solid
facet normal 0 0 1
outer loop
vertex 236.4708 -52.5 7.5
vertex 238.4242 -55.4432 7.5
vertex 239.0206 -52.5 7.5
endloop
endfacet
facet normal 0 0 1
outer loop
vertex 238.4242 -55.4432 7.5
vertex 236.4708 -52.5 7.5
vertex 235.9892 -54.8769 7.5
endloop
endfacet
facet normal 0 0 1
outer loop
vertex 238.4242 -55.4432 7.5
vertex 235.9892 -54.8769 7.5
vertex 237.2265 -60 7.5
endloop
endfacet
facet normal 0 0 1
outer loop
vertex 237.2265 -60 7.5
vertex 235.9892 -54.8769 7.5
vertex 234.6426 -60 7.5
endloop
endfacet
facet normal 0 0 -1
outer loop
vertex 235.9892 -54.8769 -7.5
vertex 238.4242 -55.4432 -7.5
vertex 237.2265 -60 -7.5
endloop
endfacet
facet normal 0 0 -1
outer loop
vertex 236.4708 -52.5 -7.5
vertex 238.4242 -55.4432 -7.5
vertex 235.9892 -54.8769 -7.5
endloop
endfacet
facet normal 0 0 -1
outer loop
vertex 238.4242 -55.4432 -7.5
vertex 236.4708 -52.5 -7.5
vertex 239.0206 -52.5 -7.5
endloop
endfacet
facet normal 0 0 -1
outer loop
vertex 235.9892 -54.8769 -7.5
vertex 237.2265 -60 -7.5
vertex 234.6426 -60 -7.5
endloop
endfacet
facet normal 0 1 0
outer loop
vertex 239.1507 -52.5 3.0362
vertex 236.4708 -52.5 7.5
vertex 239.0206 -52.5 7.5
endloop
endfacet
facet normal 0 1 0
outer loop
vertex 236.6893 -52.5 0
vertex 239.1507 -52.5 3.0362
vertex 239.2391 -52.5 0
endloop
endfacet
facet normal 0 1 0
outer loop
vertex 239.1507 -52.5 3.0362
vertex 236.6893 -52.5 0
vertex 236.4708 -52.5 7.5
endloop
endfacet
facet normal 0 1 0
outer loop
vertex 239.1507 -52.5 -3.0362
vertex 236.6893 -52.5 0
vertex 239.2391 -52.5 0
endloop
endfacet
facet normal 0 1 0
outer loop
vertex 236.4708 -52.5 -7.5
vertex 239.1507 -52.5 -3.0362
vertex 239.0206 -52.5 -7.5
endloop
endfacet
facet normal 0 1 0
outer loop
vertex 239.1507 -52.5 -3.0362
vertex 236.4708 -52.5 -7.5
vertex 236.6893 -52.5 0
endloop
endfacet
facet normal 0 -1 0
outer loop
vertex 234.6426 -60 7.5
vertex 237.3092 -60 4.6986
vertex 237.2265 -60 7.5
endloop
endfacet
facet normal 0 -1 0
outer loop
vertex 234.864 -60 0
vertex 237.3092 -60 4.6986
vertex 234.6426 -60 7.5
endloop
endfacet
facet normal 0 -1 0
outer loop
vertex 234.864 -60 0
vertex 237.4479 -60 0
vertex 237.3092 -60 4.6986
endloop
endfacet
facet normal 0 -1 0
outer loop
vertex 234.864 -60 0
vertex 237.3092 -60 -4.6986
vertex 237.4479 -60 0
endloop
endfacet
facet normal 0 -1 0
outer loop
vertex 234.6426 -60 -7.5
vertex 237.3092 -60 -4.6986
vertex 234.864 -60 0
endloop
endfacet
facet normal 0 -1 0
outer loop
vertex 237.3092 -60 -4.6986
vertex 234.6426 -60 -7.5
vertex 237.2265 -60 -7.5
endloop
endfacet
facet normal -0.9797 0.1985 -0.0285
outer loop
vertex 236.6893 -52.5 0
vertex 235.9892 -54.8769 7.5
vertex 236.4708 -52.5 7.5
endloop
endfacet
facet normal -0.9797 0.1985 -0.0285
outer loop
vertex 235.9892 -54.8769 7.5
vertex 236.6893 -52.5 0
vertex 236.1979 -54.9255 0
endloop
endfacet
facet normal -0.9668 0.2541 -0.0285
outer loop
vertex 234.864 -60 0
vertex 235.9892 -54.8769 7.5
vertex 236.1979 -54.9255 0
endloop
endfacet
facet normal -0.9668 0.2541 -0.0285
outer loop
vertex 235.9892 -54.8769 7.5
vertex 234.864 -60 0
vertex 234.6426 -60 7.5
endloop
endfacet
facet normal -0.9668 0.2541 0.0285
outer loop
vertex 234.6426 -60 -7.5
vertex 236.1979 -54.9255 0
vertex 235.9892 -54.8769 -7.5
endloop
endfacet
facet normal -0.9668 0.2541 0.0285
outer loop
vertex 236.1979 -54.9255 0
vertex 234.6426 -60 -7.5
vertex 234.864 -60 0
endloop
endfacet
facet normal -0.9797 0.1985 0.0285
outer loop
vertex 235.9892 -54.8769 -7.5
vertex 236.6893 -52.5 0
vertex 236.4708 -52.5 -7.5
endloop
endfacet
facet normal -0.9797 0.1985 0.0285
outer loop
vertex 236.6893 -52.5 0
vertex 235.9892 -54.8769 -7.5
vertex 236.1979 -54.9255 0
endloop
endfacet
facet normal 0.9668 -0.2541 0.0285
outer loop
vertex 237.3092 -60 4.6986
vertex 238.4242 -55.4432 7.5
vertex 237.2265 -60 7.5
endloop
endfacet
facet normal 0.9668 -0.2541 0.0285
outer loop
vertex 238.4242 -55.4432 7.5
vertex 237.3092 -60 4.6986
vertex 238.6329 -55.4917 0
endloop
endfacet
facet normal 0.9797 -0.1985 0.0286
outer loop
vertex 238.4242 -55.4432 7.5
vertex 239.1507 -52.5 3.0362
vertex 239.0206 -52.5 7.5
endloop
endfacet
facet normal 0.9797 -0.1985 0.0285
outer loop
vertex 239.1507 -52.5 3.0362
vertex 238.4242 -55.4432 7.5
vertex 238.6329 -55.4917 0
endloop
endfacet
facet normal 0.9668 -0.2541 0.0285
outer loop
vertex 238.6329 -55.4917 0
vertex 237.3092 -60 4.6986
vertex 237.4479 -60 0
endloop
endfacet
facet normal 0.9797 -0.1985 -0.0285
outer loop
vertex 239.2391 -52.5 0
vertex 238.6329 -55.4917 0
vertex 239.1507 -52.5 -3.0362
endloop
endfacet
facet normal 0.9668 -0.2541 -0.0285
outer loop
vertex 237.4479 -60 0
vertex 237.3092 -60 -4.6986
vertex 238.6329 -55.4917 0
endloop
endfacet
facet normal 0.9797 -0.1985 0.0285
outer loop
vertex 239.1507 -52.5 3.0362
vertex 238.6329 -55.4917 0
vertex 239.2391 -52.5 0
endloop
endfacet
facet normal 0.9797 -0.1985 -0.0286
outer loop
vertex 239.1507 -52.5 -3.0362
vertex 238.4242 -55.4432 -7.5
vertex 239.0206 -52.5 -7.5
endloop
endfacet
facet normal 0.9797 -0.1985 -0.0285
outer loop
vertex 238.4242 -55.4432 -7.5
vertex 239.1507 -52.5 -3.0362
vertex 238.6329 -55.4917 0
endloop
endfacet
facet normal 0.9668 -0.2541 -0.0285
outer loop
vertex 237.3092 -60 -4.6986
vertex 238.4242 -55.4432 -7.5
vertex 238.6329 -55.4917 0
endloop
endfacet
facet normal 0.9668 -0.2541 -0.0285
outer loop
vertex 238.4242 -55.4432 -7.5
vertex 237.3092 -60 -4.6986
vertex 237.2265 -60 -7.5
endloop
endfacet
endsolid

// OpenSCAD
// file: ../motors/MN5212.scad
use <../utils.scad>

module MN5212(){

	render(){
		translate([0,0, 42.5 / 2 - 23 / 2 - 4.9 - 6])
			cylinder(
				h = 23,
				r = 59 / 2,
				$fa = fa(59 / 2),
				center = true);
		translate([0,0, 42.5 / 2 - 4.9 / 2 - 6])
			cylinder(
				h = 4.9,
				r1 = 59 / 2,
				r2 = 24.8 / 2,
				$fa = fa(59 / 2),
				center = true);
		translate([0,0, - 42.5 / 2 + 5.6 / 2 + 3])
			cylinder(
				h = 5.6,
				r1 = 44 / 2,
				r2 = 59 / 2,
				$fa = fa(59 / 2),
				center = true);
		translate([0, 0, 42.5 / 2 - 3])
			cylinder(
				h = 6,
				r = 4 / 2,
				$fa = fa(4 / 2),
				center = true);
		translate([0, 0, - 42.5 / 2 + 1.5])
			cylinder(
				h = 3,
				r = 6 / 2,
				$fa = fa(6 / 2),
				center = true);
	}

}
// file: ../servos/HS_5065MG.scad
use <../utils.scad>

module HS_5065MG(){

	length = 23.75;
	width = 11.68;
	depth = 20.32;
	wing_width = 32.38;
	wing_thick = 3.43;
	shaft_offset = 6;
	hole_spacing = 28.32;
	shaft_height = 26.16;
	shaft_length = 2;

	module mounting_hole(){
		mh_rad = 2 / 2;
		translate(
			[
				hole_spacing / 2,
				0,
				depth / 2 - wing_thick / 2
			])
			cylinder(h = 5, r = mh_rad, $fa = fa(mh_rad), center = true);
	}

	difference(){
		union(){
			cube([length, width, depth], center = true);
			translate([0, 0, depth / 2 - wing_thick / 2])
				cube([wing_width, width, wing_thick], center = true);
			translate(
				[
					- length / 2 + shaft_offset,
					0,
					shaft_height - length / 2 + shaft_length / 2
				])
				cylinder(
					h = shaft_length,
					r = 1.5,
					$fa = fa(1.5),
					center = true);
		}	union(){

			mounting_hole();
			mirror() mounting_hole();
		}
	}
}

HS_5065MG();
// file: ../servos/LS_0006_servo.scad
// Author Michael Marques (DrYerzinia)

use <../utils.scad>

module ls_0006_servo(){
	
	length = 21.4;
	depth = 19.9;
	thickness = 11.65;

	gear_height = 2.6;
	gear_bump_height = 0.7;
	gear_bump_diameter = 1.97;
	gear_outer_bump_diameter = 6;
	gear_bump_offset = 12.2;

	shaft_height = 2.4;
	shaft_diameter = 3.74;
	shaft_offset = thickness / 2;
	shaft_screw_diameter = 1.3;
	
	wing_outer_width = 8.5;
	wing_top_off = 3.8;
	wing_length = 3.8;
	wing_thickness = 1.2;
	wing_hole_diameter = 1.85;
	wing_hole_edge_dist = 2;

	module wing_hole(){
		translate(
			[
				length / 2 + wing_hole_edge_dist,
				0,
				depth/2 - wing_top_off - wing_thickness / 2
			])
			cylinder(
				h = wing_thickness + 1,
				r = wing_hole_diameter / 2,
				$fn = 16,
				center = true);
	}

	module wing(){
		translate(
			[
				length / 2,
				thickness / 2,
				depth/2 - wing_top_off - wing_thickness
			])
			rotate([0,0,-90])
				trapezoid(
					thickness,
					wing_outer_width,
					wing_length,
					wing_thickness);
	}

	// Body
	cube([length, thickness, depth], center = true);

	difference(){
		union(){

			wing();
			mirror() wing();

			// Gear Bumps
			translate([0, 0, depth/2 + gear_height / 2]){
				translate([length / 2 - gear_bump_offset, 0, 0])
					cylinder(
						h = gear_height,
						r = gear_outer_bump_diameter / 2,
						$fn = 16,
						center = true);
				translate([length / 2 - gear_bump_offset, 0, gear_height/2 + gear_bump_height / 2])
					cylinder(
						h = gear_bump_height,
						r = gear_bump_diameter / 2,
						$fn = 16,
						center = true);
				translate([length / 2 - shaft_offset, 0, 0])
					cylinder(
						h = gear_height,
						r = thickness / 2,
						$fn = 32,
						center = true);
				// Shaft
				translate([length / 2 - shaft_offset, 0, gear_height])
					cylinder(
						h = shaft_height,
						r = shaft_diameter / 2,
						$fn = 16,
						center = true);
			}

		}
		union(){

			wing_hole();
			mirror() wing_hole();

			// Shaft_hole
			translate(
				[
					length / 2 - shaft_offset,
					0,
					depth/2 + gear_height * (3 / 2) + 0.5])
				cylinder(
					h = shaft_height + 1,
					r = shaft_screw_diameter / 2,
					$fn = 16,
					center = true);

		}
	}

}

module translate_ls_0006_attachment(){

	length = 21.4;
	thickness = 11.65;
	shaft_offset = thickness / 2;
	depth = 19.9;
	float = 3.3;

	translate([length / 2 - shaft_offset, 0, depth / 2 + float])
		children();

}

module bar_attachment(){

	height = 3.75;
	bar_length = 14.7;
	bar_thickness = 1.6;
	inner_radius = 5.9;
	outer_radius = 3.95;
	shaft_diameter = 3.7;
	upper_void_diameter = 4.8;
	screw_diameter = 2;
	hole_spacing = 2;
	hole_4_diameter = 1.2;
	hole_diameter = 1;
	hole_start_off = 4.7;
	top_void_depth = 0.67;
	bottom_void_depth = 1.84;

	translate([0, 0, height / 2]){
		difference(){
			union(){

				translate([0, inner_radius / 2, height / 2 - bar_thickness])
					rotate([0,0,-90])
						trapezoid(
							inner_radius,
							outer_radius,
							bar_length,
							bar_thickness);

				cylinder(
					h = height,
					r = inner_radius / 2,
					$fn = 16,
					center = true);

				translate([bar_length, 0, height / 2 - bar_thickness / 2])
					cylinder(
						h = bar_thickness,
						r = outer_radius / 2,
						$fn = 16,
						center = true);

			}
			union(){
				// screwhole
				cylinder(
					h = height + 1,
					r = screw_diameter / 2,
					$fn = 16,
					center = true);
				// voids
				translate([0, 0, height / 2 - top_void_depth / 2 + 0.5])
					cylinder(
						h = top_void_depth + 1,
						r = upper_void_diameter / 2,
						$fn = 16,
						center = true);
				translate([0, 0,  - bottom_void_depth / 2 - 0.5])
					cylinder(
						h = bottom_void_depth + 1,
						r = shaft_diameter / 2,
						$fn = 16,
						center = true);

				for(i = [0:4]){
					dia = (i != 3) ? hole_diameter : hole_4_diameter;
					translate(
						[
							hole_start_off + hole_spacing * i,
							0,
							height / 2 - bar_thickness / 2])
						cylinder(
							h = bar_thickness + 1,
							r = dia / 2,
							$fn = 16,
							center = true);
				}

			}
		}
	}

}

ls_0006_servo();
translate_ls_0006_attachment() bar_attachment();
// file: ../servos/parallax_continuous_rotation_servo.scad
// Author Michael Marques (DrYerzinia)

module parallax_continuous_rotation_servo(){

	depth = 37.7;
	length = 40.75;
	width = 19.75;

	mount_height = 2.7;
	mount_extent = 6.1;
	mount_from_top = 7.7;

	mount_hole_diameter = 4.46;
	mount_hole_spacing = 14.4 - mount_hole_diameter;

	shaft_diameter = 5.8;
	shaft_offset = 10;
	shaft_length = 3.5;

	module mounting_hole(){

			translate(
				[
					length / 2 + 5,
					mount_hole_spacing / 2,
					depth / 2 - mount_height / 2 - mount_from_top
				]
				)
				cylinder(
					h = mount_height + 1,
					r = mount_hole_diameter / 2,
					$fn=16,
					center = true);
	}

	difference(){
		union(){

			// Body
			cube([length,width,depth], center = true);

			// Mounting wings
			translate(
				[
					0,
					0,
					depth / 2 - mount_height / 2 - mount_from_top
				])
				cube(
					[
						length + mount_extent * 2,
						width,
						mount_height
					],
					center = true);

			// Shaft
			translate(
				[
					length / 2 - shaft_offset,
					0,
					depth / 2 + shaft_length / 2
				]
				)
				cylinder(
					h = shaft_length,
					r = shaft_diameter / 2,
					$fn = 16,
					center = true
				);

		}
		union(){

			// Mounting Holes
			mounting_hole();
			mirror()
				mounting_hole();

			translate([0,-mount_hole_spacing,0]){
				mounting_hole();
				mirror()
					mounting_hole();
			}
		}
	}

}

module translate_shaft(){

	depth = 37.7;
	length = 40.75;

	shaft_offset = 10;

	translate(
		[
			length / 2 - shaft_offset,
			0,
			depth / 2
		])
		children();
}

module round_servo_attachment(){

	height = 6;
	diameter = 20.8;
	inner_diameter = 8.6;
	plate_thickness = 2.45;

	float = 2;

	depth = 37.7;
	length = 40.75;

	shaft_offset = 10;

	plate_hole_spacing = 14.5;
	plate_hole_diameter = 1.4;
	plate_hole_minor_spacing = 3.5;

	screw_hole_diameter = 3;

	inner_diameter = 8;
	
	top_depth = 1.8;
	bottom_depth = 3.4;

	void_diameter = 5.8;

	module plate_hole(){
		cylinder(
			h = plate_thickness + 1,
			r = plate_hole_diameter / 2,
			$fn = 16,
			center = true
		);
	}

	module plate_hole_group(){
		translate([0, 0, height / 2 - plate_thickness / 2]){
			translate([0, plate_hole_spacing / 2, 0]){
					plate_hole();
					translate([- plate_hole_minor_spacing, 0, 0])
						plate_hole();
					translate([  plate_hole_minor_spacing, 0, 0])
						plate_hole();
			}
		}
	}

	translate(
		[
			length / 2 - shaft_offset,
			0,
			depth / 2 + height / 2 + float
		]
		)
		difference(){

			union(){

				// inner shaft
				cylinder(
					h = height,
					r = inner_diameter / 2,
					$fn = 16,
					center = true
				);

				// top
				translate([0, 0, height / 2 - plate_thickness / 2])
					cylinder(
						h = plate_thickness,
						r = diameter / 2,
						$fn = 32,
						center = true
					);
			}

			union(){

				// plate holes
				for(ang = [0:3]){
					rotate([0,0, ang * 90])
						plate_hole_group();
				}

				// screw hole
				cylinder(
					h = height + 1,
					r = screw_hole_diameter / 2,
					$fn = 16,
					center = true
				);

				// inner voids
				translate([0, 0, height / 2 - top_depth / 2 + 1])
					cylinder(
						h = top_depth + 1,
						r = void_diameter / 2,
						$fn = 16,
						center = true
					);
				translate([0, 0, -1])
					cylinder(
						h = bottom_depth + 1,
						r = void_diameter / 2,
						$fn = 16,
						center = true
					);

			}

		}

}

parallax_continuous_rotation_servo();
round_servo_attachment();
// file: ../hardware.scad
 // Author Michael Marques (DrYerzinia)

// http://www.ebay.com/itm/10-PCS-683-3x7x2-mm-Metal-OPEN-PRECISION-Miniature-Ball-Bearing-3-7-2-/291206307942?hash=item43cd3fa066:m:mCi6eovrGVk_CjIUjlhw8yg
// E-Bay empire.rc

module washer_M3_7x3_2x0_5mm(){

	difference(){
		cylinder(
			h = 0.5,
			r = 7 / 2,
			$fn = 16,
			center = true);
		cylinder(
			h = 0.5 + 0.1,
			r = 3.2 / 2,
			$fn = 16,
			center = true);
	}

}

module bearing_3x7x2mm(){

	difference(){
		cylinder(
			h = 2,
			r = 7 / 2,
			$fn = 16,
			center = true);
		cylinder(
			h = 2 + 1,
			r = 3 / 2,
			$fn = 16,
			center = true);
	}

}

module bearing_5x8x2_5mm(){

	difference(){
		cylinder(
			h = 2.5,
			r = 8 / 2,
			$fn = 16,
			center = true);
		cylinder(
			h = 2.5 + 1,
			r = 5 / 2,
			$fn = 16,
			center = true);
	}

}

module bearing_8x16x5mm(){

	difference(){
		cylinder(
			h = 5,
			r = 16 / 2,
			$fn = 16,
			center = true);
		cylinder(
			h = 5 + 1,
			r = 8 / 2,
			$fn = 16,
			center = true);
	}

}


bearing_5x8x2_5mm();
// file: ../utils.scad
// http://forum.openscad.org/Creating-pie-pizza-slice-shape-need-a-dynamic-length-array-td3148.html

module pie_slice(r, start_angle, end_angle) {
    R = r * sqrt(2) + 1;
    a0 = (4 * start_angle + 0 * end_angle) / 4;
    a1 = (3 * start_angle + 1 * end_angle) / 4;
    a2 = (2 * start_angle + 2 * end_angle) / 4;
    a3 = (1 * start_angle + 3 * end_angle) / 4;
    a4 = (0 * start_angle + 4 * end_angle) / 4;
    if(end_angle > start_angle)
        intersection() {
        circle(r, $fa = fa(r));
        polygon([
            [0,0],
            [R * cos(a0), R * sin(a0)],
            [R * cos(a1), R * sin(a1)],
            [R * cos(a2), R * sin(a2)],
            [R * cos(a3), R * sin(a3)],
            [R * cos(a4), R * sin(a4)],
            [0,0]
       ]);
    }
}

// https://github.com/openscad/openscad/issues/29

module rotate_about(v,a) {
	translate(v) rotate(a) translate(-v) children(0);
}

module rotate_about_axis(v, ang, axis) {
	translate(v) rotate(ang, axis) translate(-v) children(0);
}

// https://github.com/robofun/openscad-utils/blob/master/trapezoid.scad

module trapezoid(width_base, width_top,height,thickness) {
	

  linear_extrude(height = thickness) polygon(points=[[0,0],[width_base,0],[width_base-(width_base-width_top)/2,height],[(width_base-width_top)/2,height]], paths=[[0,1,2,3]]); 
  
}

// http://forum.openscad.org/fe-Tolerance-based-arc-approximation-td14212.html

function fa(r)=($fn>0)?360/$fn:($fe>0)?($fe<r)?min(45,2*acos(1-$fe/r)):45:$fa; 
// file: ../render_settings.scad
// Author Michael Marques (DrYerzinia)

// Lulzbot Mini tolerances
// x/y 0.1mm
// z   0.05mm
//
// 0.1mm   preview tolerance
// 0.025mm export  tolerance

$fs = 0.01;
$fn = undef;
$fa = 360 / 5;

$fe = 0.025;	// export
// main file
// Author Michael Marques (DrYerzinia)

include <../render_settings.scad>

use <../BB8.scad>

Door_P8_middle_door_bumper();
